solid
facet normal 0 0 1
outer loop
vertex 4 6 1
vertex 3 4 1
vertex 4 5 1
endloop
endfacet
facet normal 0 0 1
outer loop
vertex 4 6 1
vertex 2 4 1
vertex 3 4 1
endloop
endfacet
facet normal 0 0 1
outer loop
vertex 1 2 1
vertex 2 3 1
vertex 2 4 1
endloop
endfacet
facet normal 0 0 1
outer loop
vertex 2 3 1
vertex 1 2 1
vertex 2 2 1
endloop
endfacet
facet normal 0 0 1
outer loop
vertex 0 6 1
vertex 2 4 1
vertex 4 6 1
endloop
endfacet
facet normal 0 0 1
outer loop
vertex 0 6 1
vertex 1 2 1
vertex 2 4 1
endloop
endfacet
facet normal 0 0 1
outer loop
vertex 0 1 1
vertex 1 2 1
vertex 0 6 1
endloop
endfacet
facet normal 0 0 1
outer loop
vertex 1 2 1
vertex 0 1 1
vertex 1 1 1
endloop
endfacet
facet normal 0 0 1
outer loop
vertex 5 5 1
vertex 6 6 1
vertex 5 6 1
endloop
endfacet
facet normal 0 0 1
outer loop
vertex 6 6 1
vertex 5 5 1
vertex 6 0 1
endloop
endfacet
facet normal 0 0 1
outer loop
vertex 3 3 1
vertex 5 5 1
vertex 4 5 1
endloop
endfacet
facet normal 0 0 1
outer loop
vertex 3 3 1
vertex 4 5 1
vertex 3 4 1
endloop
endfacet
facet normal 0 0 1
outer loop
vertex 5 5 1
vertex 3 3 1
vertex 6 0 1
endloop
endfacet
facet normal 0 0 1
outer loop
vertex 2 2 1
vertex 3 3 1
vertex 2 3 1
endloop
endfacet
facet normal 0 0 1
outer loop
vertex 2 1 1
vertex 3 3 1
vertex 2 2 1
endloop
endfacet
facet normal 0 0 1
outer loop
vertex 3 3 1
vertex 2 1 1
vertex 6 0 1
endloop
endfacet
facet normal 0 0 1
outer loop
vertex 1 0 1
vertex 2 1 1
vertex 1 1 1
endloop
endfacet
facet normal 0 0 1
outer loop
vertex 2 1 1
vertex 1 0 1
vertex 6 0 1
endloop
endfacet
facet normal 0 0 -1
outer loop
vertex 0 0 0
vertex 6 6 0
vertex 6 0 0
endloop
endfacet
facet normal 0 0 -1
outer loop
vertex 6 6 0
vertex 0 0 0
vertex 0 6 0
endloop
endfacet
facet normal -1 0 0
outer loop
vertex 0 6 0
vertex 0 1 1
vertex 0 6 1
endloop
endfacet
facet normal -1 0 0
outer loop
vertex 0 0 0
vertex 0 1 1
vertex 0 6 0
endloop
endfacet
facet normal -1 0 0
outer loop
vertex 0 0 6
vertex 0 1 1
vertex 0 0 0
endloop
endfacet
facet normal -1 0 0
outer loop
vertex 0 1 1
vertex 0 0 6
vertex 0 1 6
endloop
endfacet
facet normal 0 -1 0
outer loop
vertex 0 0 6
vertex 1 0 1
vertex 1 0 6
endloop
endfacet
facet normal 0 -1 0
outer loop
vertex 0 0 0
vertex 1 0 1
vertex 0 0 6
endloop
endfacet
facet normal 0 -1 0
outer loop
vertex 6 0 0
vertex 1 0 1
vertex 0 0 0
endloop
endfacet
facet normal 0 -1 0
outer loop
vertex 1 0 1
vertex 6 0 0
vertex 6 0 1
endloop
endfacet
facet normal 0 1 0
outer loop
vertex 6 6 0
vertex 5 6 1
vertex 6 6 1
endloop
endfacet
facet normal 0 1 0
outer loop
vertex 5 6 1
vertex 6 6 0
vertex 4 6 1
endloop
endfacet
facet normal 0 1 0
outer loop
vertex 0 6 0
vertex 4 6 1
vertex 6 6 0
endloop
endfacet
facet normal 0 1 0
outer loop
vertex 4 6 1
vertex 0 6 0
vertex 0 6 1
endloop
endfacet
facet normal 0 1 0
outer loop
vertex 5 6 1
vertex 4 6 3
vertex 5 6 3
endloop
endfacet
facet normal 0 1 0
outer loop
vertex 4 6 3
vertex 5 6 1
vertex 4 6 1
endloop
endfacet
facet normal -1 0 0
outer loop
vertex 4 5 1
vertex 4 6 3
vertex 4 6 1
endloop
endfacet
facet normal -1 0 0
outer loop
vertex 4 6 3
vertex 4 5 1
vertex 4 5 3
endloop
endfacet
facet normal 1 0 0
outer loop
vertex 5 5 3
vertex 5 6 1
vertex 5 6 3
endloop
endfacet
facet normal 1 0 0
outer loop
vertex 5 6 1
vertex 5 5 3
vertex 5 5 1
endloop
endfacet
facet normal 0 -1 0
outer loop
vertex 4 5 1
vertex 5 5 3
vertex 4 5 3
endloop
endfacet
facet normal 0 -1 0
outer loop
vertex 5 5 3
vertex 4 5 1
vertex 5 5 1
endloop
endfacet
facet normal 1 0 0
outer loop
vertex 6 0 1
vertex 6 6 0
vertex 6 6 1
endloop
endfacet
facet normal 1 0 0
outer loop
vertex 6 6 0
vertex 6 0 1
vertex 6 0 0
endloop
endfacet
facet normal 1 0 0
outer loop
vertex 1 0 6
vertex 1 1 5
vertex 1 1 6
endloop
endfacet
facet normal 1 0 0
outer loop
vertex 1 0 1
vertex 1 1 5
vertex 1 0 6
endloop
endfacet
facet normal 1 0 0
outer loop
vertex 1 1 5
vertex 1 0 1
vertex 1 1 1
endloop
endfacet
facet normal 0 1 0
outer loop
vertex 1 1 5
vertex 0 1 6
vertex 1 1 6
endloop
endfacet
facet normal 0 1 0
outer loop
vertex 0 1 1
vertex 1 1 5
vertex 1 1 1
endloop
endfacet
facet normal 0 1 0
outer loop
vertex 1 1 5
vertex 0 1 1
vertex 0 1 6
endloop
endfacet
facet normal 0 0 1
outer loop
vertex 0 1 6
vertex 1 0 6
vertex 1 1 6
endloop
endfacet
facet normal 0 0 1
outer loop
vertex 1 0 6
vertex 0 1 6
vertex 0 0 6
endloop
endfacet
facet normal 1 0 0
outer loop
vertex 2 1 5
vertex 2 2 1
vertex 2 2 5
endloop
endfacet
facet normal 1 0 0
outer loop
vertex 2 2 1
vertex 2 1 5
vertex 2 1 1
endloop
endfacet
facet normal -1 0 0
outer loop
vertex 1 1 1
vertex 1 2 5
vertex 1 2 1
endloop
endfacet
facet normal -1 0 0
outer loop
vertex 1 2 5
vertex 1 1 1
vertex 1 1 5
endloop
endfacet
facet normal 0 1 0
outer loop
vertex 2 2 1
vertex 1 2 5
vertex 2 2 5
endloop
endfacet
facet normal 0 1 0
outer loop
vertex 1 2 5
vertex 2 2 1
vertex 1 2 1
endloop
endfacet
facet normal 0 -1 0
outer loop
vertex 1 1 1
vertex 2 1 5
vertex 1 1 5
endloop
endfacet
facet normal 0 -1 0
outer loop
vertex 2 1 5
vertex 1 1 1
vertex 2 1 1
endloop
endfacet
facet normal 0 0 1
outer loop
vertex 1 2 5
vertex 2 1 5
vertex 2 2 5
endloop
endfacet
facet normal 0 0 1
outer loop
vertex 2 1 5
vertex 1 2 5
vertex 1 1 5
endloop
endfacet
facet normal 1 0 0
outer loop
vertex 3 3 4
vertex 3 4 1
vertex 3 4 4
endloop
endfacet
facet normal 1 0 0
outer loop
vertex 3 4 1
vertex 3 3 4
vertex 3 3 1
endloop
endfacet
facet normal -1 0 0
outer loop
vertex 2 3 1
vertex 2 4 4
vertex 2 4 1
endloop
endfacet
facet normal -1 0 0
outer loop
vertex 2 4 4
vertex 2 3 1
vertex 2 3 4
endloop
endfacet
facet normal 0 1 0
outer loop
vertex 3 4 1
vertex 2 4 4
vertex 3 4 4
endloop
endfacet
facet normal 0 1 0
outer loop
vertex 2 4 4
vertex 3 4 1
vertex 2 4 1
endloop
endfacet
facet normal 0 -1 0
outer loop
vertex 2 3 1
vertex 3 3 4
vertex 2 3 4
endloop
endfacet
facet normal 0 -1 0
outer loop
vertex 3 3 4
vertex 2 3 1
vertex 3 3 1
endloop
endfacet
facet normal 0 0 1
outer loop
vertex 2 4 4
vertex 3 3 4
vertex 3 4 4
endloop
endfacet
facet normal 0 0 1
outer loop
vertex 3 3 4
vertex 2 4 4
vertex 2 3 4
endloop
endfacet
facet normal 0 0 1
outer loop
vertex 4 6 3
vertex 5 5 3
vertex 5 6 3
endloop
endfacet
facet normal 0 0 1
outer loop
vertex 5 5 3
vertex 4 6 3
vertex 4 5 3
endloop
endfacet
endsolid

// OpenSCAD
union() {
    translate([0, 0, 0]) cube([1, 1, 1]);
    translate([0, 1, 0]) cube([1, 1, 1]);
    translate([0, 2, 0]) cube([1, 1, 1]);
    translate([0, 3, 0]) cube([1, 1, 1]);
    translate([0, 4, 0]) cube([1, 1, 1]);
    translate([0, 5, 0]) cube([1, 1, 1]);
    translate([1, 0, 0]) cube([1, 1, 1]);
    translate([1, 1, 0]) cube([1, 1, 1]);
    translate([1, 2, 0]) cube([1, 1, 1]);
    translate([1, 3, 0]) cube([1, 1, 1]);
    translate([1, 4, 0]) cube([1, 1, 1]);
    translate([1, 5, 0]) cube([1, 1, 1]);
    translate([2, 0, 0]) cube([1, 1, 1]);
    translate([2, 1, 0]) cube([1, 1, 1]);
    translate([2, 2, 0]) cube([1, 1, 1]);
    translate([2, 3, 0]) cube([1, 1, 1]);
    translate([2, 4, 0]) cube([1, 1, 1]);
    translate([2, 5, 0]) cube([1, 1, 1]);
    translate([3, 0, 0]) cube([1, 1, 1]);
    translate([3, 1, 0]) cube([1, 1, 1]);
    translate([3, 2, 0]) cube([1, 1, 1]);
    translate([3, 3, 0]) cube([1, 1, 1]);
    translate([3, 4, 0]) cube([1, 1, 1]);
    translate([3, 5, 0]) cube([1, 1, 1]);
    translate([4, 0, 0]) cube([1, 1, 1]);
    translate([4, 1, 0]) cube([1, 1, 1]);
    translate([4, 2, 0]) cube([1, 1, 1]);
    translate([4, 3, 0]) cube([1, 1, 1]);
    translate([4, 4, 0]) cube([1, 1, 1]);
    translate([4, 5, 0]) cube([1, 1, 1]);
    translate([5, 0, 0]) cube([1, 1, 1]);
    translate([5, 1, 0]) cube([1, 1, 1]);
    translate([5, 2, 0]) cube([1, 1, 1]);
    translate([5, 3, 0]) cube([1, 1, 1]);
    translate([5, 4, 0]) cube([1, 1, 1]);
    translate([5, 5, 0]) cube([1, 1, 1]);
    translate([0, 0, 1]) cube([1, 1, 1]);
    translate([0, 0, 2]) cube([1, 1, 1]);
    translate([0, 0, 3]) cube([1, 1, 1]);
    translate([0, 0, 4]) cube([1, 1, 1]);
    translate([0, 0, 5]) cube([1, 1, 1]);
    translate([1, 1, 1]) cube([1, 1, 1]);
    translate([1, 1, 2]) cube([1, 1, 1]);
    translate([1, 1, 3]) cube([1, 1, 1]);
    translate([1, 1, 4]) cube([1, 1, 1]);
    translate([2, 3, 1]) cube([1, 1, 1]);
    translate([2, 3, 2]) cube([1, 1, 1]);
    translate([2, 3, 3]) cube([1, 1, 1]);
    translate([4, 5, 1]) cube([1, 1, 1]);
    translate([4, 5, 2]) cube([1, 1, 1]);
}
